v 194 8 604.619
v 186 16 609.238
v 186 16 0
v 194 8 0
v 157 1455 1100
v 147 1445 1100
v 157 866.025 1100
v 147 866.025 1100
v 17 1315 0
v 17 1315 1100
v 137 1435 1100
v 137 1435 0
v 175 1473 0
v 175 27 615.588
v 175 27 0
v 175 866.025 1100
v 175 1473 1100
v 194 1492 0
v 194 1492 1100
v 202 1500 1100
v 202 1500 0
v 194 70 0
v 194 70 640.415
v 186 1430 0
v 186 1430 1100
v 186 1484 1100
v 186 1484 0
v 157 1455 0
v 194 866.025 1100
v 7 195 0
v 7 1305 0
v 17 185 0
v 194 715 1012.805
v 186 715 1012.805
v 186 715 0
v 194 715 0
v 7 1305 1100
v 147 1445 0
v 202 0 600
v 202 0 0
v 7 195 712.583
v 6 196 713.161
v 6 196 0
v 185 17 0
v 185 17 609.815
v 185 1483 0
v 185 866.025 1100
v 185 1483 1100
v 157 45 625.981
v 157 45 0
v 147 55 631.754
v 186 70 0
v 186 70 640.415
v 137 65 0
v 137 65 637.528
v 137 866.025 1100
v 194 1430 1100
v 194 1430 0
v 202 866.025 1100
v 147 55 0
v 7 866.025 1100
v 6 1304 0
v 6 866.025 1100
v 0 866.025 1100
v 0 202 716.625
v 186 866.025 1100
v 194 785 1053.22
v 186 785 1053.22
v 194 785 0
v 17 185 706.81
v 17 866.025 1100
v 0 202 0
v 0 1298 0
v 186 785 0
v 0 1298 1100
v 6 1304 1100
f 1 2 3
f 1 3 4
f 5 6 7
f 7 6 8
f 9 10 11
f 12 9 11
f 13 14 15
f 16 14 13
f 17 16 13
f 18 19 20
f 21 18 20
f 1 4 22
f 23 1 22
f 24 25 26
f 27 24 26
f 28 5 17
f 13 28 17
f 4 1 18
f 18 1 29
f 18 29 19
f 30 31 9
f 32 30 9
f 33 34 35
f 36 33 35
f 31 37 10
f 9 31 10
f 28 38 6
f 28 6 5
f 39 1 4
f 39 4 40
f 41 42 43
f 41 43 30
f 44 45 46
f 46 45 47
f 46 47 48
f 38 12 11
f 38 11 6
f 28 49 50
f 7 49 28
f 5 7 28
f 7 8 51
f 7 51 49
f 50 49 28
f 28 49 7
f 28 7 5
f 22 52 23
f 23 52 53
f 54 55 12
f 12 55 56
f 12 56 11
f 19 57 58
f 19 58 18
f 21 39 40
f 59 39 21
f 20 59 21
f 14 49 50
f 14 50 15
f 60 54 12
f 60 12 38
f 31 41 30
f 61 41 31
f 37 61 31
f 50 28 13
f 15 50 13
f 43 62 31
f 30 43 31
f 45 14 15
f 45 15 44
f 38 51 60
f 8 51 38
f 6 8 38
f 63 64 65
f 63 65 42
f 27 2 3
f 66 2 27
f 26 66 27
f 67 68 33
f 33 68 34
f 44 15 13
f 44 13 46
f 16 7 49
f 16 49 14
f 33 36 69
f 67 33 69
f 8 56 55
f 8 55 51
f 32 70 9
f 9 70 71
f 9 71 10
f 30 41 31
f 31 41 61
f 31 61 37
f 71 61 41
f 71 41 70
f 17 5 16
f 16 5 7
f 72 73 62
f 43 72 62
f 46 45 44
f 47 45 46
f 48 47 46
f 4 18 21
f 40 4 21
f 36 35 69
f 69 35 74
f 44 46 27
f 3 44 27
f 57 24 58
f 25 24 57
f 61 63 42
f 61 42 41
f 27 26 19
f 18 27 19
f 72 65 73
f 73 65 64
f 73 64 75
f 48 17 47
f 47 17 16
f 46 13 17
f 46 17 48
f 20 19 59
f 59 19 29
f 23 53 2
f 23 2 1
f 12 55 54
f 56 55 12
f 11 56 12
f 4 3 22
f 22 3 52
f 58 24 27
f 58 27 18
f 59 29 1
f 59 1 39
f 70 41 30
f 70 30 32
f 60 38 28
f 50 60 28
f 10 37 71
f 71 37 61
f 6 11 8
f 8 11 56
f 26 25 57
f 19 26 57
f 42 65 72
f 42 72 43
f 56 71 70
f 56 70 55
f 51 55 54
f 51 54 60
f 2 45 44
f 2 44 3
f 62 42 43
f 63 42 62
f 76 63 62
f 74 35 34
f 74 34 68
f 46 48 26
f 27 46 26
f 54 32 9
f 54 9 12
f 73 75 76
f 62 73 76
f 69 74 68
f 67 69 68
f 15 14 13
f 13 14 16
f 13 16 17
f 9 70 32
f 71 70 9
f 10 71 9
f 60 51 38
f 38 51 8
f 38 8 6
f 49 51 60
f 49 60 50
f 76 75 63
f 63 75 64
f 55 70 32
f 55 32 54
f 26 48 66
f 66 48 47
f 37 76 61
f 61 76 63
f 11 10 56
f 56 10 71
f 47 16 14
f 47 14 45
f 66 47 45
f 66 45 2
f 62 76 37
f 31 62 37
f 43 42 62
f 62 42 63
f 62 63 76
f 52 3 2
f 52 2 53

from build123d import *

# Parameters (mm, degrees)
F1_DEPTH  = 6
F2_DEPTH  = 1
F3_DEPTH  = 10
F4_DEPTH  = 120
F5_DEPTH  = 10
F6_DEPTH  = 10
F7_DEPTH  = 18
F8_DEPTH  = 10
F9_DEPTH  = 1
F10_W     = 70
F10_H     = 1100
F11_DEPTH = 8
F13_DEPTH = 8
F15_DEPTH = 1100.001
F17_DEPTH = 1100.001


with BuildPart() as f1:
    # F0 (on Right) → F1 (new body)
    with BuildSketch(Plane.YZ):
        Polygon((0, 600), (0, 0), (1500, 0), (1500, 1100), (866.0254037844, 1100), align=None)
    extrude(amount=F1_DEPTH)


with BuildPart() as f2:
    # F2 (new): a face of the model
    f2_faces = [f1.part.faces().sort_by_distance(p)[0] for p in [
        (6, 819.6757626206, 492.1036143057),
    ]]
    extrude(f2_faces, amount=F2_DEPTH)


with BuildPart() as f3:
    # F3 (new): a face of the model
    f3_faces = [f2.part.faces().sort_by_distance(p)[0] for p in [
        (7, 819.6757626206, 492.1036143057),
    ]]
    extrude(f3_faces, amount=F3_DEPTH)


with BuildPart() as f4:
    # F4 (new): a face of the model
    f4_faces = [f3.part.faces().sort_by_distance(p)[0] for p in [
        (17, 819.6757626206, 492.1036143057),
    ]]
    extrude(f4_faces, amount=F4_DEPTH)


with BuildPart() as f5:
    # F5 (new): a face of the model
    f5_faces = [f4.part.faces().sort_by_distance(p)[0] for p in [
        (137, 819.6757626206, 492.1036143057),
    ]]
    extrude(f5_faces, amount=F5_DEPTH)


with BuildPart() as f6:
    # F6 (new): a face of the model
    f6_faces = [f5.part.faces().sort_by_distance(p)[0] for p in [
        (147, 819.6757626206, 492.1036143057),
    ]]
    extrude(f6_faces, amount=F6_DEPTH)


with BuildPart() as f7:
    # F7 (new): a face of the model
    f7_faces = [f6.part.faces().sort_by_distance(p)[0] for p in [
        (157, 819.6757626206, 492.1036143057),
    ]]
    extrude(f7_faces, amount=F7_DEPTH)


with BuildPart() as f8:
    # F8 (new): a face of the model
    f8_faces = [f7.part.faces().sort_by_distance(p)[0] for p in [
        (175, 819.6757626206, 492.1036143057),
    ]]
    extrude(f8_faces, amount=F8_DEPTH)


with BuildPart() as f9:
    # F9 (new): a face of the model
    f9_faces = [f8.part.faces().sort_by_distance(p)[0] for p in [
        (185, 819.6757626206, 492.1036143057),
    ]]
    extrude(f9_faces, amount=F9_DEPTH)


with BuildPart() as f11:
    # F10 (on face) → F11 (new body)
    with BuildSketch(Plane.YZ.offset(186)):
        with Locations((1465, 550)):
            Rectangle(F10_W, F10_H)
    extrude(amount=F11_DEPTH)


with BuildPart() as f11b:
    # F10 (on face) → F11, piece 2 (new body)
    with BuildSketch(Plane.YZ.offset(186)):
        Polygon((715, 1012.8054424706), (715, 0), (785, 0), (785, 1053.2199613139), align=None)
    extrude(amount=F11_DEPTH)


with BuildPart() as f11c:
    # F10 (on face) → F11, piece 3 (new body)
    with BuildSketch(Plane.YZ.offset(186)):
        Polygon((0, 600), (0, 0), (70, 0), (70, 640.4145188433), align=None)
    extrude(amount=F11_DEPTH)


with BuildPart() as f13:
    # F12 (on face) → F13 (new body)
    with BuildSketch(Plane.YZ.offset(194)):
        Polygon((866.0254037844, 1100), (0, 600), (0, 0), (1500, 0), (1500, 1100), align=None)
    extrude(amount=F13_DEPTH)


with BuildPart() as f15_tool:
    # F14 (on face) → F15 (new body, through all)
    with BuildSketch(Plane.XY.offset(1100)):
        Polygon((0, 1298), (202, 1500), (0, 1500), align=None)
    extrude(amount=-F15_DEPTH)


with BuildPart() as f1_1:
    add(f1.part)

    # F15: cut by f15_tool
    add(f15_tool.part, mode=Mode.SUBTRACT)


with BuildPart() as f2_1:
    add(f2.part)

    # F15: cut by f15_tool
    add(f15_tool.part, mode=Mode.SUBTRACT)


with BuildPart() as f3_1:
    add(f3.part)

    # F15: cut by f15_tool
    add(f15_tool.part, mode=Mode.SUBTRACT)


with BuildPart() as f4_1:
    add(f4.part)

    # F15: cut by f15_tool
    add(f15_tool.part, mode=Mode.SUBTRACT)


with BuildPart() as f5_1:
    add(f5.part)

    # F15: cut by f15_tool
    add(f15_tool.part, mode=Mode.SUBTRACT)


with BuildPart() as f6_1:
    add(f6.part)

    # F15: cut by f15_tool
    add(f15_tool.part, mode=Mode.SUBTRACT)


with BuildPart() as f7_1:
    add(f7.part)

    # F15: cut by f15_tool
    add(f15_tool.part, mode=Mode.SUBTRACT)


with BuildPart() as f8_1:
    add(f8.part)

    # F15: cut by f15_tool
    add(f15_tool.part, mode=Mode.SUBTRACT)


with BuildPart() as f9_1:
    add(f9.part)

    # F15: cut by f15_tool
    add(f15_tool.part, mode=Mode.SUBTRACT)


with BuildPart() as f11_1:
    add(f11.part)

    # F15: cut by f15_tool
    add(f15_tool.part, mode=Mode.SUBTRACT)


with BuildPart() as f13_1:
    add(f13.part)

    # F15: cut by f15_tool
    add(f15_tool.part, mode=Mode.SUBTRACT)


with BuildPart() as f17_tool:
    # F16 (on face) → F17 (new body, through all)
    with BuildSketch(Plane(origin=(0, 0, 0), x_dir=(1, 0, 0), z_dir=(0, 0, -1))):
        Polygon((0, 0), (0, -202), (202, 0), align=None)
    extrude(amount=-F17_DEPTH)


with BuildPart() as f1_2:
    add(f1_1.part)

    # F17: cut by f17_tool
    add(f17_tool.part, mode=Mode.SUBTRACT)


with BuildPart() as f2_2:
    add(f2_1.part)

    # F17: cut by f17_tool
    add(f17_tool.part, mode=Mode.SUBTRACT)


with BuildPart() as f3_2:
    add(f3_1.part)

    # F17: cut by f17_tool
    add(f17_tool.part, mode=Mode.SUBTRACT)


with BuildPart() as f4_2:
    add(f4_1.part)

    # F17: cut by f17_tool
    add(f17_tool.part, mode=Mode.SUBTRACT)


with BuildPart() as f5_2:
    add(f5_1.part)

    # F17: cut by f17_tool
    add(f17_tool.part, mode=Mode.SUBTRACT)


with BuildPart() as f6_2:
    add(f6_1.part)

    # F17: cut by f17_tool
    add(f17_tool.part, mode=Mode.SUBTRACT)


with BuildPart() as f7_2:
    add(f7_1.part)

    # F17: cut by f17_tool
    add(f17_tool.part, mode=Mode.SUBTRACT)


with BuildPart() as f8_2:
    add(f8_1.part)

    # F17: cut by f17_tool
    add(f17_tool.part, mode=Mode.SUBTRACT)


with BuildPart() as f9_2:
    add(f9_1.part)

    # F17: cut by f17_tool
    add(f17_tool.part, mode=Mode.SUBTRACT)


with BuildPart() as f11c_1:
    add(f11c.part)

    # F17: cut by f17_tool
    add(f17_tool.part, mode=Mode.SUBTRACT)


with BuildPart() as f13_2:
    add(f13_1.part)

    # F17: cut by f17_tool
    add(f17_tool.part, mode=Mode.SUBTRACT)


solid = Compound([f11b.part, f11_1.part, f1_2.part, f2_2.part, f3_2.part, f4_2.part, f5_2.part, f6_2.part, f7_2.part, f8_2.part, f9_2.part, f11c_1.part, f13_2.part])
